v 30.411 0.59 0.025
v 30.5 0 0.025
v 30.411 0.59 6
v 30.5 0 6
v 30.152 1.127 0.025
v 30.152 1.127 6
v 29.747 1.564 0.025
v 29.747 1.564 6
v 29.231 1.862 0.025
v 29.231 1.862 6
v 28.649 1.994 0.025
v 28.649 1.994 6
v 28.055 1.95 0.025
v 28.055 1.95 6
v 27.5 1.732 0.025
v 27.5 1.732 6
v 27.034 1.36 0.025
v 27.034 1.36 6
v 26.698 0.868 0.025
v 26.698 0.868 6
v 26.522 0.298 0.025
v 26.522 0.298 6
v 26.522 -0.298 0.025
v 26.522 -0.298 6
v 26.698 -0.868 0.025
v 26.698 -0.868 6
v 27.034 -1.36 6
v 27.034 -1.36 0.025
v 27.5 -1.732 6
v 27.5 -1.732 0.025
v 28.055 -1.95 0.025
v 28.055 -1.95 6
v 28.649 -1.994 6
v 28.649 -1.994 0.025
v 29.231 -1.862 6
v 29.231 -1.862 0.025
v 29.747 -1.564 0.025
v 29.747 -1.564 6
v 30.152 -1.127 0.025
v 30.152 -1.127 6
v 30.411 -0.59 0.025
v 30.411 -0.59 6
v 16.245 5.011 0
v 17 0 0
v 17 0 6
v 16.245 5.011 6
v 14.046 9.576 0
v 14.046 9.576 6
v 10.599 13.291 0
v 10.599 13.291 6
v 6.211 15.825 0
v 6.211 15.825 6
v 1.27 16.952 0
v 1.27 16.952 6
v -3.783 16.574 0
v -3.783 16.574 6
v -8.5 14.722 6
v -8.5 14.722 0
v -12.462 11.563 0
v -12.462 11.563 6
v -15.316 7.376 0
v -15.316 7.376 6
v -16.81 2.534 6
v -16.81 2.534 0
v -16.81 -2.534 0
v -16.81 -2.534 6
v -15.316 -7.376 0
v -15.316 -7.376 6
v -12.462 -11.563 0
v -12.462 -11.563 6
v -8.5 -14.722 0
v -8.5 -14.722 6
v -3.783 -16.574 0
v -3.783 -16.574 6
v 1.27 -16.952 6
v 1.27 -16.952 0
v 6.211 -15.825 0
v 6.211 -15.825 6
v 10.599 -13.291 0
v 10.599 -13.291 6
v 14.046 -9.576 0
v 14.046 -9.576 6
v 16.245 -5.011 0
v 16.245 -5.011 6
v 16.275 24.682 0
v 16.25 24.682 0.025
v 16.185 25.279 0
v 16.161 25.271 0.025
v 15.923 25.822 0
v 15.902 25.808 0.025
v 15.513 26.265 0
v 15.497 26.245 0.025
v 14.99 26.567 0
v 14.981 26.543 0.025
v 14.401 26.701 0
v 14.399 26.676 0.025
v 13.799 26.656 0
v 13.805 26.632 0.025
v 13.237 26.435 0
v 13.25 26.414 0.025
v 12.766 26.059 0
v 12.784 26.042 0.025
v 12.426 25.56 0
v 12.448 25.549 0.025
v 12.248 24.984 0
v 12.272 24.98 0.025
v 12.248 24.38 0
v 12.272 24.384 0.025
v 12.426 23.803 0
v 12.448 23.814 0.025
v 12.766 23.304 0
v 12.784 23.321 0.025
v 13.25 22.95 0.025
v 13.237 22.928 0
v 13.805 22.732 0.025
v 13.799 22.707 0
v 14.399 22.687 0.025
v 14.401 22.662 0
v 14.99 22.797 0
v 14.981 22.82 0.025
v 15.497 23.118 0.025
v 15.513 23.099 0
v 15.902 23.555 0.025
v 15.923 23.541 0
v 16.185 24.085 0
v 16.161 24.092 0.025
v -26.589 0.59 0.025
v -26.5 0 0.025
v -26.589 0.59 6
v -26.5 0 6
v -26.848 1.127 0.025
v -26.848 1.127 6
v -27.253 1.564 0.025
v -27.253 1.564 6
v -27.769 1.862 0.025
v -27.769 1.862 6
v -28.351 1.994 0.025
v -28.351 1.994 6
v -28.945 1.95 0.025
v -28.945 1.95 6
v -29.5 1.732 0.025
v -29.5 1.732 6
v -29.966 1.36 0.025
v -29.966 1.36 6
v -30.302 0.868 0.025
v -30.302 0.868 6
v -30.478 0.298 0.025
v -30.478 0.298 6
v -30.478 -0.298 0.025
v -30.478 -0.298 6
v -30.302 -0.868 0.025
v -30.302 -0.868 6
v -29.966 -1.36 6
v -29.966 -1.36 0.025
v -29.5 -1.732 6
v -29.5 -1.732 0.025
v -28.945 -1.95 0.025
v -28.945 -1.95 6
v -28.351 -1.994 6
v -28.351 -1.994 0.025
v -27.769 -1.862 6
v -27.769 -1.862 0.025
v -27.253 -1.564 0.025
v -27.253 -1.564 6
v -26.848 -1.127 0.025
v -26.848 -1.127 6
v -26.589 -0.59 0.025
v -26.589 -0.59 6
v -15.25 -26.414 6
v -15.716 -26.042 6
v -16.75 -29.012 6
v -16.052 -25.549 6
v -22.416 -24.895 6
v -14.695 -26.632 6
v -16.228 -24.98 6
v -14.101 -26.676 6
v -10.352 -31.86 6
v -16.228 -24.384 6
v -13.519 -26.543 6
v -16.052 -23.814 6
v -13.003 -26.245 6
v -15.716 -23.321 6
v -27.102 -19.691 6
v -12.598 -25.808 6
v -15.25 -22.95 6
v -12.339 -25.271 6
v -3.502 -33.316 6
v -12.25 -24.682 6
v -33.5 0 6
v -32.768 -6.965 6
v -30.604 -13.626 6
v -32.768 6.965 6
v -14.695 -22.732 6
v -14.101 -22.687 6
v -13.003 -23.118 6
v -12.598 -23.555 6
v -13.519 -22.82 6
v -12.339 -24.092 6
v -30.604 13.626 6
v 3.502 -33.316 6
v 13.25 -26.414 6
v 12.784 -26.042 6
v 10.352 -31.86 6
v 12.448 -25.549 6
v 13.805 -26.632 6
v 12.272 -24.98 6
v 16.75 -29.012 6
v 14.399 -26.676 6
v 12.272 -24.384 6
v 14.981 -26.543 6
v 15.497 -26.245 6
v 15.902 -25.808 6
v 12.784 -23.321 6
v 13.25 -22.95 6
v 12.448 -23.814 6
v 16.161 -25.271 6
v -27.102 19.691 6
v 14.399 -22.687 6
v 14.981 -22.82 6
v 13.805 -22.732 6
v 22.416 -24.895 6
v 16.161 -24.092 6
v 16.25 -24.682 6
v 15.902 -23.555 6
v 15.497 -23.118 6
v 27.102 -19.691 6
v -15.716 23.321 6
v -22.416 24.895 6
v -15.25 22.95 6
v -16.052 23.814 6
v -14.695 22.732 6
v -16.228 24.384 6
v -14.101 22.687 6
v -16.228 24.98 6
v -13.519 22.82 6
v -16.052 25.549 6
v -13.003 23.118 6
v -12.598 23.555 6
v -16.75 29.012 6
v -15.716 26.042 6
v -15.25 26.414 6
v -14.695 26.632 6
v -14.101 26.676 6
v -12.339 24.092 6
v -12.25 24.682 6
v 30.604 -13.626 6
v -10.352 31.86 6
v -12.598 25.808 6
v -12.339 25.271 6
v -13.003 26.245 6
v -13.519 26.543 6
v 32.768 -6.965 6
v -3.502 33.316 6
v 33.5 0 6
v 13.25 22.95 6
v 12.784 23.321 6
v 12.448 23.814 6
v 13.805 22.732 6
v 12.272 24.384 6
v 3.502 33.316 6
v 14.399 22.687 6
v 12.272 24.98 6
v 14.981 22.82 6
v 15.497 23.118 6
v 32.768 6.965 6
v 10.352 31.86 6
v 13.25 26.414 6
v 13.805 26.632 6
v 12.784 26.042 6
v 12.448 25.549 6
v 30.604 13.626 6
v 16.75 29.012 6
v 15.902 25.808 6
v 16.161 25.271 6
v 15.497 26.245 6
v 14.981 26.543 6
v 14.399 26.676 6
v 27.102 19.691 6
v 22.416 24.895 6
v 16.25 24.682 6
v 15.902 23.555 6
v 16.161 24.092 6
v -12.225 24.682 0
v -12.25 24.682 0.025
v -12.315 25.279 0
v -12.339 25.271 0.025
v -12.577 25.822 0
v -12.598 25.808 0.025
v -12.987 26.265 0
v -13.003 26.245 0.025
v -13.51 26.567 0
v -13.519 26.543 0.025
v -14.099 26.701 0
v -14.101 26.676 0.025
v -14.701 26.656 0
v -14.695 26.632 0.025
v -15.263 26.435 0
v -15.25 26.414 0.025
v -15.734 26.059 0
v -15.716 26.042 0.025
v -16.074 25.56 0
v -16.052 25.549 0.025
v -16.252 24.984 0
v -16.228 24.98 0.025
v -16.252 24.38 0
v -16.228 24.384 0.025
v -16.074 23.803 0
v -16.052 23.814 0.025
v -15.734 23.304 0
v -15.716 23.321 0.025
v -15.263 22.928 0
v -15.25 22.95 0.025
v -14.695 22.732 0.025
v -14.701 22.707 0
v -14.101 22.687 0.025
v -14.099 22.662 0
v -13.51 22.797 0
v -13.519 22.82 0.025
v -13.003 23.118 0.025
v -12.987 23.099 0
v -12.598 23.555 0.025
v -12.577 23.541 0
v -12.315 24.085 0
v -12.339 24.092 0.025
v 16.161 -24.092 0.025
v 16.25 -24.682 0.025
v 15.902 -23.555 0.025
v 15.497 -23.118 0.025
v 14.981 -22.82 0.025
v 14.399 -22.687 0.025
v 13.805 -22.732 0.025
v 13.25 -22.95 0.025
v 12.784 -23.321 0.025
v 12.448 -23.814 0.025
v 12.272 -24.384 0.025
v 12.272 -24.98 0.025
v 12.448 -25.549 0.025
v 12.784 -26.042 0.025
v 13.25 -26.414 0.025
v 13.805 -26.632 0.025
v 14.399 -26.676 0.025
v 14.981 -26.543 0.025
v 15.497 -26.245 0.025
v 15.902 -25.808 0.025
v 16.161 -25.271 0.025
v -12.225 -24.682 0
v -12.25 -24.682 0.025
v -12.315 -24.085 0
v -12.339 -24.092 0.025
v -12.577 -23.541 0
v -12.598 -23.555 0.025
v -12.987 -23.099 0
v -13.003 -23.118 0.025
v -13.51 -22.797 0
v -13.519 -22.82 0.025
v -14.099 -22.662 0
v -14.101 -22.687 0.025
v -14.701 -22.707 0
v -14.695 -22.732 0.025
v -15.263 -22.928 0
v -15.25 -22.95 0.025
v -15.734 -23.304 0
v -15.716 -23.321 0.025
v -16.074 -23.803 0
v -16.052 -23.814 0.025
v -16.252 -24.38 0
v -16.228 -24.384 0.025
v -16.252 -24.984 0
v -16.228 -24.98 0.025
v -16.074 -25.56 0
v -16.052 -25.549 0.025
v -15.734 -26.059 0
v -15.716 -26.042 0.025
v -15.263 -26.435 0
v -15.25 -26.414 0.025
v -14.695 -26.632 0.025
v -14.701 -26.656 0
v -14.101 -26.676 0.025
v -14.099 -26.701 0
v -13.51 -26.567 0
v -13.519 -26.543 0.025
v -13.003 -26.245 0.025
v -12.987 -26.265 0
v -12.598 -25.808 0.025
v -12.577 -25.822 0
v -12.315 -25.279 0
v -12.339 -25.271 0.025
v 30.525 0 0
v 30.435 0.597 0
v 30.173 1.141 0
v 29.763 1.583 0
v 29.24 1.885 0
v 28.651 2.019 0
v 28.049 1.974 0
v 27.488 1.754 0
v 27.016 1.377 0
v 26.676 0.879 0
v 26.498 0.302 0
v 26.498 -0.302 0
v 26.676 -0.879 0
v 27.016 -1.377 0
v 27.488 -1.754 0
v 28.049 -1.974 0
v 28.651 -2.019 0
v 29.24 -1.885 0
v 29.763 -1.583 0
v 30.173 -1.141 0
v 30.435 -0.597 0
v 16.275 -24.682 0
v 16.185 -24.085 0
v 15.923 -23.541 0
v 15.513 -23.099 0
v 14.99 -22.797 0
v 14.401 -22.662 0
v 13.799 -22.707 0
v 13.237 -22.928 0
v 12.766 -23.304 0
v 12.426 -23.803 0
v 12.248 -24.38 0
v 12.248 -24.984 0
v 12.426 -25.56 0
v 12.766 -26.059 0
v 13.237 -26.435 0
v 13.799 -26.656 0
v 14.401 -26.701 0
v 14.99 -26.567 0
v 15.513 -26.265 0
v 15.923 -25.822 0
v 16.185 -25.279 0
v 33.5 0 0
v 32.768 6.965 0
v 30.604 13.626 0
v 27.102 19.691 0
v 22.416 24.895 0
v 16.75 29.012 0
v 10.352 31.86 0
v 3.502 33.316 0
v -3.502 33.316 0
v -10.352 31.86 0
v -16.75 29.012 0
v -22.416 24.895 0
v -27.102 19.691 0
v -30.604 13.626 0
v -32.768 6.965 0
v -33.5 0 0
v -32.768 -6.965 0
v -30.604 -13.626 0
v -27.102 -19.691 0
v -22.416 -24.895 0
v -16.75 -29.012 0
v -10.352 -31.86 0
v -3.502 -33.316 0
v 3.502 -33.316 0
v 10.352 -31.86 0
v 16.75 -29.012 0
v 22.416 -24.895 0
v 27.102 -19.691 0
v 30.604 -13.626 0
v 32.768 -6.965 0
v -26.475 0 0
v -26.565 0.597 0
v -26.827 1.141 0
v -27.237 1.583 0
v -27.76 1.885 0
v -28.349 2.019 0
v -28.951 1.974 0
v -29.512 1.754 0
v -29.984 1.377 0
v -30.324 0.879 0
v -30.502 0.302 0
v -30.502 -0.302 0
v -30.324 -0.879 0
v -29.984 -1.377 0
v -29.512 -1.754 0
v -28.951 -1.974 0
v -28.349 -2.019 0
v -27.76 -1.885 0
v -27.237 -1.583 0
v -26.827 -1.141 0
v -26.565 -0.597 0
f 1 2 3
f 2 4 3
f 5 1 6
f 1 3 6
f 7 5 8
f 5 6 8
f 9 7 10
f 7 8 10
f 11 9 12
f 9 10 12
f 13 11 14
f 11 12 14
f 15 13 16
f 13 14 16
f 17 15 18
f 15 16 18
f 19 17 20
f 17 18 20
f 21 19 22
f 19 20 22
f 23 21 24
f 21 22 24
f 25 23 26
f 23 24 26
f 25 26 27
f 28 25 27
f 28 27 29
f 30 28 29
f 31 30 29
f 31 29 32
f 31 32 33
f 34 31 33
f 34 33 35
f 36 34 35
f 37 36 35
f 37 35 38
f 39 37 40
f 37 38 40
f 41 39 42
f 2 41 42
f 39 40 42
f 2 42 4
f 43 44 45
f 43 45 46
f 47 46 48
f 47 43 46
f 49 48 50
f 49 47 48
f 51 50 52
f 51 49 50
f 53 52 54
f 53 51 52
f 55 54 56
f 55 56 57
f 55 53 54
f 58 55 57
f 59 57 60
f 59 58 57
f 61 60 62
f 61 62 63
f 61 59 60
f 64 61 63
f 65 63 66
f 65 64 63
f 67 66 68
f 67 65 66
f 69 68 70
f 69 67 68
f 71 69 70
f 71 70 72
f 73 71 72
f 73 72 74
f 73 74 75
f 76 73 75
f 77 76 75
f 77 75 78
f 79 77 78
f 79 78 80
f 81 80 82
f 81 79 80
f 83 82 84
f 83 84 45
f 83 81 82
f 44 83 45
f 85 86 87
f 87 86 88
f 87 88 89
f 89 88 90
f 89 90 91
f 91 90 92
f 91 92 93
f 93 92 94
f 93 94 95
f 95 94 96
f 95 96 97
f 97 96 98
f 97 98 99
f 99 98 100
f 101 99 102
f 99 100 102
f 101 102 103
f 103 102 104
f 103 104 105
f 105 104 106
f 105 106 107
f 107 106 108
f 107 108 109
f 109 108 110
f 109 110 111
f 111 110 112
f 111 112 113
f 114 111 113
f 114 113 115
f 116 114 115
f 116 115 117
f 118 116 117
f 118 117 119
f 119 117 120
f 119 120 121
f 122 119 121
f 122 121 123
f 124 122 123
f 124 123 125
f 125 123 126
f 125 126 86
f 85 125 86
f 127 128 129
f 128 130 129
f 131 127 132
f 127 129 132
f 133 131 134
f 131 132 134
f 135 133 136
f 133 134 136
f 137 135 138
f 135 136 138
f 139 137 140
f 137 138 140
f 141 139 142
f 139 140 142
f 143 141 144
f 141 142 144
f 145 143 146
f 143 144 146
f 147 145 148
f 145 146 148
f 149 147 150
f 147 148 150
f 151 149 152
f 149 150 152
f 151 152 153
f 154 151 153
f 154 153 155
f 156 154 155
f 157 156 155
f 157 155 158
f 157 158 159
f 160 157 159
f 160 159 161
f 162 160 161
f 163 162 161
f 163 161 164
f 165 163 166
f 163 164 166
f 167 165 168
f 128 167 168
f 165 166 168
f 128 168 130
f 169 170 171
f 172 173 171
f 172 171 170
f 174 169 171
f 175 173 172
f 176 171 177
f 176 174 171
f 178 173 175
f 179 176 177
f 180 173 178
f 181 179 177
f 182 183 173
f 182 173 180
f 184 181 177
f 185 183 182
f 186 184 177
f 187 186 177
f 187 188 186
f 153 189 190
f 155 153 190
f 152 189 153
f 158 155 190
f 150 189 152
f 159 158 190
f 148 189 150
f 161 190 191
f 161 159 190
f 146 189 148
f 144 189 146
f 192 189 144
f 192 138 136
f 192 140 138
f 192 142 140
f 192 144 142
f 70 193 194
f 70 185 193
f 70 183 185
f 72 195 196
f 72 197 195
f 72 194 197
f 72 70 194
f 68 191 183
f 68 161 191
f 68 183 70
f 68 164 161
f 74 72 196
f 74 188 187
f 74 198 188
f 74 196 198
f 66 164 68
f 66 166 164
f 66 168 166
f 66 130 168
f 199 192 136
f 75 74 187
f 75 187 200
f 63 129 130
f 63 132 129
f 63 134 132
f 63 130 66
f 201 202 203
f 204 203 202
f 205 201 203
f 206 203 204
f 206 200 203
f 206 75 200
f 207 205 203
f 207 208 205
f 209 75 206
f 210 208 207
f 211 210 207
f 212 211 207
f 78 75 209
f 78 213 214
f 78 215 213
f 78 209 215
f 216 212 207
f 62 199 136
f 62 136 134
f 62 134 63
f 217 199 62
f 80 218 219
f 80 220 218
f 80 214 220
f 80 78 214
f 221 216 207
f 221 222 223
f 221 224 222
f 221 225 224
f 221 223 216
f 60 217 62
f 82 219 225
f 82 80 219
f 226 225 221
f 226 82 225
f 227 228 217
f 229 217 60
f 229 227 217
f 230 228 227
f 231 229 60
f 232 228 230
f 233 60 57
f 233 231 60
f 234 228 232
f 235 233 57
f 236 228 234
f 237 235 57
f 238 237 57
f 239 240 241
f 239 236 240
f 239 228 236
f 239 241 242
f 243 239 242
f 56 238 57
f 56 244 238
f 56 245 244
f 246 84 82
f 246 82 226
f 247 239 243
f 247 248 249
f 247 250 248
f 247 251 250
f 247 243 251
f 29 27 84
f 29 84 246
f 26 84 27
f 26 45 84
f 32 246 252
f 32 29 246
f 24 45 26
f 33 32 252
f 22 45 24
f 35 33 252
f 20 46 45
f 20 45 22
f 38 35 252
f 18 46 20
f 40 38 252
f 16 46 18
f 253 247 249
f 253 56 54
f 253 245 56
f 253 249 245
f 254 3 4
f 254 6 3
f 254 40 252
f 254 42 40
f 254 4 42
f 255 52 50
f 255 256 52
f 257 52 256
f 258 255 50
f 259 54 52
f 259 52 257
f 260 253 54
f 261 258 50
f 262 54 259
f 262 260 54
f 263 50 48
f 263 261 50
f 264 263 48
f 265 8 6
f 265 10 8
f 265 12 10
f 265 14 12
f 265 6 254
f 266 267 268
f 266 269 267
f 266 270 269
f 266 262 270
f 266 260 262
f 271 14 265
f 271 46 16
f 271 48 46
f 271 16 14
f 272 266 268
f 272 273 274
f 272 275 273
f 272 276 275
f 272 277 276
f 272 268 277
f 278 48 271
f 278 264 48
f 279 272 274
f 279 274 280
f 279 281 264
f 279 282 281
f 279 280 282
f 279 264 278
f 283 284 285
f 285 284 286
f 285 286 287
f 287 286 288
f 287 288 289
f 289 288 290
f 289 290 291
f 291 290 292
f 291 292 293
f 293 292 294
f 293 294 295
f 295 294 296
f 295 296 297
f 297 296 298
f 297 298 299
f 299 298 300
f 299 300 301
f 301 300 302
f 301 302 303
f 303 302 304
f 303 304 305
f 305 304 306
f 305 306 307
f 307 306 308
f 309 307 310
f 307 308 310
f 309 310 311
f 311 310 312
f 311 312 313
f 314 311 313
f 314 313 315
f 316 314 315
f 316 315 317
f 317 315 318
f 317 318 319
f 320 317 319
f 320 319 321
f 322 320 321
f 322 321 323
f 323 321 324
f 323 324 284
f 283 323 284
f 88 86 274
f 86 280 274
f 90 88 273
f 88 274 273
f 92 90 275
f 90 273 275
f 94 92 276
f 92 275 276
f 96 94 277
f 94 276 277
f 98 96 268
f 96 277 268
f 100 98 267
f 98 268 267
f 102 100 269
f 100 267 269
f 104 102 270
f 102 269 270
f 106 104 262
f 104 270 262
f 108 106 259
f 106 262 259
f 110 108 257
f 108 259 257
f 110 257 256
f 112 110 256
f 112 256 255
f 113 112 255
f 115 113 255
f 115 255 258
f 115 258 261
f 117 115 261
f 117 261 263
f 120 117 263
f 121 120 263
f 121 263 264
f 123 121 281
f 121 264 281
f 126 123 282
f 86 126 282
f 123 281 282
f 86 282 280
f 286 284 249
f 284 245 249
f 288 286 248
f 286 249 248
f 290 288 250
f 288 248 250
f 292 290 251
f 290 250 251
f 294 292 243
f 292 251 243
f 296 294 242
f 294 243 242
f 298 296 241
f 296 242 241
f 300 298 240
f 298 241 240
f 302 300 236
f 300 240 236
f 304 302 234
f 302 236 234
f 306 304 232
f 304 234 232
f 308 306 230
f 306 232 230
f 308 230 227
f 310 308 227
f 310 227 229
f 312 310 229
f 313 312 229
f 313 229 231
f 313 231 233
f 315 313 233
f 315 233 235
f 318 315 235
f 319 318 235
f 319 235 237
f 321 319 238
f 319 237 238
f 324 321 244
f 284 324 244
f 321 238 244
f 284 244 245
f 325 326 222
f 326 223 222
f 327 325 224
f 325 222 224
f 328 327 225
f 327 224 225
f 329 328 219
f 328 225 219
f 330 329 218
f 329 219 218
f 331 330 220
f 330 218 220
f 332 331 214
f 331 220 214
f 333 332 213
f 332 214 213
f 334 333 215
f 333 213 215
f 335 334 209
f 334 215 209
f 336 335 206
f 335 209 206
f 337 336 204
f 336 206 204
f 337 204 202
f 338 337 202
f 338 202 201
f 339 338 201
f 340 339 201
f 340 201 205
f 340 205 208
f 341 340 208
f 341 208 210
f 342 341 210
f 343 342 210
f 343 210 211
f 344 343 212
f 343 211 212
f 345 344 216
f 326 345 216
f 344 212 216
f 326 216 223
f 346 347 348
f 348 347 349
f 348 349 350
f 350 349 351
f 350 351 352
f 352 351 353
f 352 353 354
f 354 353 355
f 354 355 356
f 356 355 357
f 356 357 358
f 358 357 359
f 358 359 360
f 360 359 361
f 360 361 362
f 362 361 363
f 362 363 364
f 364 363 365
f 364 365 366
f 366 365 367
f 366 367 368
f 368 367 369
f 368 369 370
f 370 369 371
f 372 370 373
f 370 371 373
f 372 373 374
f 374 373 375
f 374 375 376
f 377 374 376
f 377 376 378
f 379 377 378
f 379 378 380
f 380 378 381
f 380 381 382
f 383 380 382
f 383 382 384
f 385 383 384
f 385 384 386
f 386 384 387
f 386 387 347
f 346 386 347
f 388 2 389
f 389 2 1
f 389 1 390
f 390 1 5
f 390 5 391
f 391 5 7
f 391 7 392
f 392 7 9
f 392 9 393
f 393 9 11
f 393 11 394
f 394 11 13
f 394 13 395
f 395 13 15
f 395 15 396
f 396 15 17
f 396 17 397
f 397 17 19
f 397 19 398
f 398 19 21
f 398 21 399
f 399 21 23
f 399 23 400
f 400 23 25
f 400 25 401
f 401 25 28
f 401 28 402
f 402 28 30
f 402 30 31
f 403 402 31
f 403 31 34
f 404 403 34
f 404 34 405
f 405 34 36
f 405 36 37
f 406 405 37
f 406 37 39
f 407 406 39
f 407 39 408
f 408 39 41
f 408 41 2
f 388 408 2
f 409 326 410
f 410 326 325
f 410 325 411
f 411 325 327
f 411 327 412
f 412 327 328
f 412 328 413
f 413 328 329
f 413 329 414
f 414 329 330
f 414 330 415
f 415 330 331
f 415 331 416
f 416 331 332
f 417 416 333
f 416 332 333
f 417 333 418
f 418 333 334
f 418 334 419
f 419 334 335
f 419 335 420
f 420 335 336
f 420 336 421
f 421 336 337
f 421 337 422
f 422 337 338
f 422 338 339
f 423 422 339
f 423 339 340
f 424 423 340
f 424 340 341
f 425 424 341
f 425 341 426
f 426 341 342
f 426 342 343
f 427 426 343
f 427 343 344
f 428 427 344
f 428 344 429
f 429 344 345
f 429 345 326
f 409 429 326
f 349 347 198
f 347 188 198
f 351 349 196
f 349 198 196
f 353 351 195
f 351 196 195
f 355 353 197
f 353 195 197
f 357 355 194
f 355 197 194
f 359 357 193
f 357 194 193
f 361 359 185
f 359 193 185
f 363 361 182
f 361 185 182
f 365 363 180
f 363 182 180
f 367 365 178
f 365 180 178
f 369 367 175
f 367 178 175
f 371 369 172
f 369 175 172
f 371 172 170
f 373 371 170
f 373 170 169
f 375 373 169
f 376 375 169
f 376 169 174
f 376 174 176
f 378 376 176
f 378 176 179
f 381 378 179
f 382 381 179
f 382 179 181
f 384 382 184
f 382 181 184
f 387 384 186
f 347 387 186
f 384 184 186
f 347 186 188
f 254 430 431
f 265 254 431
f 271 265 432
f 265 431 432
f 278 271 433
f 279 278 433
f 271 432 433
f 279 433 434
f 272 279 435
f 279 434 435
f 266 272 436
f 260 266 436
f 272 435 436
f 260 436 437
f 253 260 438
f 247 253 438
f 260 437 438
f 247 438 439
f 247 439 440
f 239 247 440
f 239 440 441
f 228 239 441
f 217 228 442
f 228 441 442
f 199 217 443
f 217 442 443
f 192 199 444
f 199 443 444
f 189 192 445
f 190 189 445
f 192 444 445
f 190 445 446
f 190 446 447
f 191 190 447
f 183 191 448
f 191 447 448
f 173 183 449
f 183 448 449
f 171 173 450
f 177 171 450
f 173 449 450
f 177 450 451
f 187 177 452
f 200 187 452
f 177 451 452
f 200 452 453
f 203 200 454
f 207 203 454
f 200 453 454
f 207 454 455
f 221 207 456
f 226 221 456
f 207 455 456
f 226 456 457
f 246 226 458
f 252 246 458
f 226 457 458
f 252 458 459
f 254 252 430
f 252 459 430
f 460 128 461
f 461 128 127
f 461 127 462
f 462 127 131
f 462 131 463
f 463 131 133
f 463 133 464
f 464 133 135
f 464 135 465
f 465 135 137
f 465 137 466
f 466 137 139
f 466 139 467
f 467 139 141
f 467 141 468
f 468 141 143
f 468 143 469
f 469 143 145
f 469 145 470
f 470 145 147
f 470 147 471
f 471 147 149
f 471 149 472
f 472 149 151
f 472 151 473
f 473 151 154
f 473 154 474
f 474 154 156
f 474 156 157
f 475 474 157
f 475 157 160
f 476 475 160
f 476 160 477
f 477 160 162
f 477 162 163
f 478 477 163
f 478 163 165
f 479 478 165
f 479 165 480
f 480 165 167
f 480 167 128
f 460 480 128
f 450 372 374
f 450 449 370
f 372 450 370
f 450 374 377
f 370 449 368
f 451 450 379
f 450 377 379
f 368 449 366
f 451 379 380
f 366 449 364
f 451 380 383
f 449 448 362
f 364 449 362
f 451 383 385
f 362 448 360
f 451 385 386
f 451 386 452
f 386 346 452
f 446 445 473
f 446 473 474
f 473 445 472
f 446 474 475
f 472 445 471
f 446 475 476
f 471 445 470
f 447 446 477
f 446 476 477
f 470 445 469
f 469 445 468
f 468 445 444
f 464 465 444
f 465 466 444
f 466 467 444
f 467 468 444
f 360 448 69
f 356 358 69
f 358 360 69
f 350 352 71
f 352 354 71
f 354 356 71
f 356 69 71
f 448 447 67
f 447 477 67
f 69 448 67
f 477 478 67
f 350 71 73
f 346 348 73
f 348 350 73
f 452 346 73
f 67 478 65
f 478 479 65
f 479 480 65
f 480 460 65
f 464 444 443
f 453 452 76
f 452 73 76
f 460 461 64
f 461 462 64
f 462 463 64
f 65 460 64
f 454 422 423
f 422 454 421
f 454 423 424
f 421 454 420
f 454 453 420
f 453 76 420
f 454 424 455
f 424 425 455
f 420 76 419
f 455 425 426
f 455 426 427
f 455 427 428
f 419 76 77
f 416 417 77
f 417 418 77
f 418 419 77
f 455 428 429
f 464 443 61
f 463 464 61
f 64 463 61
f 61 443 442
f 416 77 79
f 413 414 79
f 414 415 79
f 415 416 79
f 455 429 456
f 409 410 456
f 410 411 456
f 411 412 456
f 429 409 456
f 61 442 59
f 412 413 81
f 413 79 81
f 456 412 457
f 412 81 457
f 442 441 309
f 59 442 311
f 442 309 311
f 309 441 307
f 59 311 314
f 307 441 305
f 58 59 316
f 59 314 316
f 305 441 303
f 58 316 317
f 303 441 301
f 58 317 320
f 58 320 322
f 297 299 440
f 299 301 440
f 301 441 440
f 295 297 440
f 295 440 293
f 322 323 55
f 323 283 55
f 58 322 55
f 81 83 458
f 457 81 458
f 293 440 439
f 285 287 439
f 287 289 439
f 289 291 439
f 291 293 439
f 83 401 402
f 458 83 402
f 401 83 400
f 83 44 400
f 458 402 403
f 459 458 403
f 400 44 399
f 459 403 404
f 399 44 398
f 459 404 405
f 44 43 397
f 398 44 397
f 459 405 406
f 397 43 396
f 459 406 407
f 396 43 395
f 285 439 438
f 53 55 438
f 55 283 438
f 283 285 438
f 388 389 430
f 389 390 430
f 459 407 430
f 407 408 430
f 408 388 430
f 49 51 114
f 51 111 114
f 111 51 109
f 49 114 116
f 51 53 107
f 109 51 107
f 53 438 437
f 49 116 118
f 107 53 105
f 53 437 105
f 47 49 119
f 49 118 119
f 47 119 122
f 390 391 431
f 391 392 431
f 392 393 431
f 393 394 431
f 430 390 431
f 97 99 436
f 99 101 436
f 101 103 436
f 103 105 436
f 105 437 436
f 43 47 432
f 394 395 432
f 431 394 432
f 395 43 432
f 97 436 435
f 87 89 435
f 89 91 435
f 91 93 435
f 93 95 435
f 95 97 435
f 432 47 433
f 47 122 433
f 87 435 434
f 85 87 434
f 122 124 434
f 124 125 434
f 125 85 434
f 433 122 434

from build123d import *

# Parameters (mm, degrees)
SKETCH1_R                       = 33.5
SKETCH1_R_2                     = 17
BOSS_EXTRUDE1_DEPTH             = 6
F_4_0MM_DOWEL_HOLE1_D           = 4
F_4_0MM_DOWEL_HOLE1_DEPTH       = 24.5
F_4_0MM_DOWEL_HOLE1_CSINK_D     = 4.05
F_4_0MM_DOWEL_HOLE1_CSINK_ANGLE = 90
F_4_0MM_DOWEL_HOLE1_TIP         = 1.201721238


with BuildPart() as part:
    # Sketch1 → Boss-Extrude1 (new body)
    with BuildSketch(Plane.XY):
        Circle(SKETCH1_R)
        Circle(SKETCH1_R_2, mode=Mode.SUBTRACT)
    extrude(amount=BOSS_EXTRUDE1_DEPTH)

    # Ø4.0mm Dowel Hole1
    with Locations(Plane(origin=(28.5, 0, 0), x_dir=(-1, 0, 0), z_dir=(0, 0, -1))):
        with Locations((0, 0), (14.25, 24.681724008), (42.75, 24.681724008), (57, 0), (42.75, -24.681724008), (14.25, -24.681724008)):
            CounterSinkHole(F_4_0MM_DOWEL_HOLE1_D / 2, F_4_0MM_DOWEL_HOLE1_CSINK_D / 2, depth=F_4_0MM_DOWEL_HOLE1_DEPTH, counter_sink_angle=F_4_0MM_DOWEL_HOLE1_CSINK_ANGLE)
            with Locations((0, 0, -(F_4_0MM_DOWEL_HOLE1_DEPTH + F_4_0MM_DOWEL_HOLE1_TIP / 2))):  # 118° drill point
                Cone(0, F_4_0MM_DOWEL_HOLE1_D / 2, F_4_0MM_DOWEL_HOLE1_TIP, mode=Mode.SUBTRACT)


solid = part.part
